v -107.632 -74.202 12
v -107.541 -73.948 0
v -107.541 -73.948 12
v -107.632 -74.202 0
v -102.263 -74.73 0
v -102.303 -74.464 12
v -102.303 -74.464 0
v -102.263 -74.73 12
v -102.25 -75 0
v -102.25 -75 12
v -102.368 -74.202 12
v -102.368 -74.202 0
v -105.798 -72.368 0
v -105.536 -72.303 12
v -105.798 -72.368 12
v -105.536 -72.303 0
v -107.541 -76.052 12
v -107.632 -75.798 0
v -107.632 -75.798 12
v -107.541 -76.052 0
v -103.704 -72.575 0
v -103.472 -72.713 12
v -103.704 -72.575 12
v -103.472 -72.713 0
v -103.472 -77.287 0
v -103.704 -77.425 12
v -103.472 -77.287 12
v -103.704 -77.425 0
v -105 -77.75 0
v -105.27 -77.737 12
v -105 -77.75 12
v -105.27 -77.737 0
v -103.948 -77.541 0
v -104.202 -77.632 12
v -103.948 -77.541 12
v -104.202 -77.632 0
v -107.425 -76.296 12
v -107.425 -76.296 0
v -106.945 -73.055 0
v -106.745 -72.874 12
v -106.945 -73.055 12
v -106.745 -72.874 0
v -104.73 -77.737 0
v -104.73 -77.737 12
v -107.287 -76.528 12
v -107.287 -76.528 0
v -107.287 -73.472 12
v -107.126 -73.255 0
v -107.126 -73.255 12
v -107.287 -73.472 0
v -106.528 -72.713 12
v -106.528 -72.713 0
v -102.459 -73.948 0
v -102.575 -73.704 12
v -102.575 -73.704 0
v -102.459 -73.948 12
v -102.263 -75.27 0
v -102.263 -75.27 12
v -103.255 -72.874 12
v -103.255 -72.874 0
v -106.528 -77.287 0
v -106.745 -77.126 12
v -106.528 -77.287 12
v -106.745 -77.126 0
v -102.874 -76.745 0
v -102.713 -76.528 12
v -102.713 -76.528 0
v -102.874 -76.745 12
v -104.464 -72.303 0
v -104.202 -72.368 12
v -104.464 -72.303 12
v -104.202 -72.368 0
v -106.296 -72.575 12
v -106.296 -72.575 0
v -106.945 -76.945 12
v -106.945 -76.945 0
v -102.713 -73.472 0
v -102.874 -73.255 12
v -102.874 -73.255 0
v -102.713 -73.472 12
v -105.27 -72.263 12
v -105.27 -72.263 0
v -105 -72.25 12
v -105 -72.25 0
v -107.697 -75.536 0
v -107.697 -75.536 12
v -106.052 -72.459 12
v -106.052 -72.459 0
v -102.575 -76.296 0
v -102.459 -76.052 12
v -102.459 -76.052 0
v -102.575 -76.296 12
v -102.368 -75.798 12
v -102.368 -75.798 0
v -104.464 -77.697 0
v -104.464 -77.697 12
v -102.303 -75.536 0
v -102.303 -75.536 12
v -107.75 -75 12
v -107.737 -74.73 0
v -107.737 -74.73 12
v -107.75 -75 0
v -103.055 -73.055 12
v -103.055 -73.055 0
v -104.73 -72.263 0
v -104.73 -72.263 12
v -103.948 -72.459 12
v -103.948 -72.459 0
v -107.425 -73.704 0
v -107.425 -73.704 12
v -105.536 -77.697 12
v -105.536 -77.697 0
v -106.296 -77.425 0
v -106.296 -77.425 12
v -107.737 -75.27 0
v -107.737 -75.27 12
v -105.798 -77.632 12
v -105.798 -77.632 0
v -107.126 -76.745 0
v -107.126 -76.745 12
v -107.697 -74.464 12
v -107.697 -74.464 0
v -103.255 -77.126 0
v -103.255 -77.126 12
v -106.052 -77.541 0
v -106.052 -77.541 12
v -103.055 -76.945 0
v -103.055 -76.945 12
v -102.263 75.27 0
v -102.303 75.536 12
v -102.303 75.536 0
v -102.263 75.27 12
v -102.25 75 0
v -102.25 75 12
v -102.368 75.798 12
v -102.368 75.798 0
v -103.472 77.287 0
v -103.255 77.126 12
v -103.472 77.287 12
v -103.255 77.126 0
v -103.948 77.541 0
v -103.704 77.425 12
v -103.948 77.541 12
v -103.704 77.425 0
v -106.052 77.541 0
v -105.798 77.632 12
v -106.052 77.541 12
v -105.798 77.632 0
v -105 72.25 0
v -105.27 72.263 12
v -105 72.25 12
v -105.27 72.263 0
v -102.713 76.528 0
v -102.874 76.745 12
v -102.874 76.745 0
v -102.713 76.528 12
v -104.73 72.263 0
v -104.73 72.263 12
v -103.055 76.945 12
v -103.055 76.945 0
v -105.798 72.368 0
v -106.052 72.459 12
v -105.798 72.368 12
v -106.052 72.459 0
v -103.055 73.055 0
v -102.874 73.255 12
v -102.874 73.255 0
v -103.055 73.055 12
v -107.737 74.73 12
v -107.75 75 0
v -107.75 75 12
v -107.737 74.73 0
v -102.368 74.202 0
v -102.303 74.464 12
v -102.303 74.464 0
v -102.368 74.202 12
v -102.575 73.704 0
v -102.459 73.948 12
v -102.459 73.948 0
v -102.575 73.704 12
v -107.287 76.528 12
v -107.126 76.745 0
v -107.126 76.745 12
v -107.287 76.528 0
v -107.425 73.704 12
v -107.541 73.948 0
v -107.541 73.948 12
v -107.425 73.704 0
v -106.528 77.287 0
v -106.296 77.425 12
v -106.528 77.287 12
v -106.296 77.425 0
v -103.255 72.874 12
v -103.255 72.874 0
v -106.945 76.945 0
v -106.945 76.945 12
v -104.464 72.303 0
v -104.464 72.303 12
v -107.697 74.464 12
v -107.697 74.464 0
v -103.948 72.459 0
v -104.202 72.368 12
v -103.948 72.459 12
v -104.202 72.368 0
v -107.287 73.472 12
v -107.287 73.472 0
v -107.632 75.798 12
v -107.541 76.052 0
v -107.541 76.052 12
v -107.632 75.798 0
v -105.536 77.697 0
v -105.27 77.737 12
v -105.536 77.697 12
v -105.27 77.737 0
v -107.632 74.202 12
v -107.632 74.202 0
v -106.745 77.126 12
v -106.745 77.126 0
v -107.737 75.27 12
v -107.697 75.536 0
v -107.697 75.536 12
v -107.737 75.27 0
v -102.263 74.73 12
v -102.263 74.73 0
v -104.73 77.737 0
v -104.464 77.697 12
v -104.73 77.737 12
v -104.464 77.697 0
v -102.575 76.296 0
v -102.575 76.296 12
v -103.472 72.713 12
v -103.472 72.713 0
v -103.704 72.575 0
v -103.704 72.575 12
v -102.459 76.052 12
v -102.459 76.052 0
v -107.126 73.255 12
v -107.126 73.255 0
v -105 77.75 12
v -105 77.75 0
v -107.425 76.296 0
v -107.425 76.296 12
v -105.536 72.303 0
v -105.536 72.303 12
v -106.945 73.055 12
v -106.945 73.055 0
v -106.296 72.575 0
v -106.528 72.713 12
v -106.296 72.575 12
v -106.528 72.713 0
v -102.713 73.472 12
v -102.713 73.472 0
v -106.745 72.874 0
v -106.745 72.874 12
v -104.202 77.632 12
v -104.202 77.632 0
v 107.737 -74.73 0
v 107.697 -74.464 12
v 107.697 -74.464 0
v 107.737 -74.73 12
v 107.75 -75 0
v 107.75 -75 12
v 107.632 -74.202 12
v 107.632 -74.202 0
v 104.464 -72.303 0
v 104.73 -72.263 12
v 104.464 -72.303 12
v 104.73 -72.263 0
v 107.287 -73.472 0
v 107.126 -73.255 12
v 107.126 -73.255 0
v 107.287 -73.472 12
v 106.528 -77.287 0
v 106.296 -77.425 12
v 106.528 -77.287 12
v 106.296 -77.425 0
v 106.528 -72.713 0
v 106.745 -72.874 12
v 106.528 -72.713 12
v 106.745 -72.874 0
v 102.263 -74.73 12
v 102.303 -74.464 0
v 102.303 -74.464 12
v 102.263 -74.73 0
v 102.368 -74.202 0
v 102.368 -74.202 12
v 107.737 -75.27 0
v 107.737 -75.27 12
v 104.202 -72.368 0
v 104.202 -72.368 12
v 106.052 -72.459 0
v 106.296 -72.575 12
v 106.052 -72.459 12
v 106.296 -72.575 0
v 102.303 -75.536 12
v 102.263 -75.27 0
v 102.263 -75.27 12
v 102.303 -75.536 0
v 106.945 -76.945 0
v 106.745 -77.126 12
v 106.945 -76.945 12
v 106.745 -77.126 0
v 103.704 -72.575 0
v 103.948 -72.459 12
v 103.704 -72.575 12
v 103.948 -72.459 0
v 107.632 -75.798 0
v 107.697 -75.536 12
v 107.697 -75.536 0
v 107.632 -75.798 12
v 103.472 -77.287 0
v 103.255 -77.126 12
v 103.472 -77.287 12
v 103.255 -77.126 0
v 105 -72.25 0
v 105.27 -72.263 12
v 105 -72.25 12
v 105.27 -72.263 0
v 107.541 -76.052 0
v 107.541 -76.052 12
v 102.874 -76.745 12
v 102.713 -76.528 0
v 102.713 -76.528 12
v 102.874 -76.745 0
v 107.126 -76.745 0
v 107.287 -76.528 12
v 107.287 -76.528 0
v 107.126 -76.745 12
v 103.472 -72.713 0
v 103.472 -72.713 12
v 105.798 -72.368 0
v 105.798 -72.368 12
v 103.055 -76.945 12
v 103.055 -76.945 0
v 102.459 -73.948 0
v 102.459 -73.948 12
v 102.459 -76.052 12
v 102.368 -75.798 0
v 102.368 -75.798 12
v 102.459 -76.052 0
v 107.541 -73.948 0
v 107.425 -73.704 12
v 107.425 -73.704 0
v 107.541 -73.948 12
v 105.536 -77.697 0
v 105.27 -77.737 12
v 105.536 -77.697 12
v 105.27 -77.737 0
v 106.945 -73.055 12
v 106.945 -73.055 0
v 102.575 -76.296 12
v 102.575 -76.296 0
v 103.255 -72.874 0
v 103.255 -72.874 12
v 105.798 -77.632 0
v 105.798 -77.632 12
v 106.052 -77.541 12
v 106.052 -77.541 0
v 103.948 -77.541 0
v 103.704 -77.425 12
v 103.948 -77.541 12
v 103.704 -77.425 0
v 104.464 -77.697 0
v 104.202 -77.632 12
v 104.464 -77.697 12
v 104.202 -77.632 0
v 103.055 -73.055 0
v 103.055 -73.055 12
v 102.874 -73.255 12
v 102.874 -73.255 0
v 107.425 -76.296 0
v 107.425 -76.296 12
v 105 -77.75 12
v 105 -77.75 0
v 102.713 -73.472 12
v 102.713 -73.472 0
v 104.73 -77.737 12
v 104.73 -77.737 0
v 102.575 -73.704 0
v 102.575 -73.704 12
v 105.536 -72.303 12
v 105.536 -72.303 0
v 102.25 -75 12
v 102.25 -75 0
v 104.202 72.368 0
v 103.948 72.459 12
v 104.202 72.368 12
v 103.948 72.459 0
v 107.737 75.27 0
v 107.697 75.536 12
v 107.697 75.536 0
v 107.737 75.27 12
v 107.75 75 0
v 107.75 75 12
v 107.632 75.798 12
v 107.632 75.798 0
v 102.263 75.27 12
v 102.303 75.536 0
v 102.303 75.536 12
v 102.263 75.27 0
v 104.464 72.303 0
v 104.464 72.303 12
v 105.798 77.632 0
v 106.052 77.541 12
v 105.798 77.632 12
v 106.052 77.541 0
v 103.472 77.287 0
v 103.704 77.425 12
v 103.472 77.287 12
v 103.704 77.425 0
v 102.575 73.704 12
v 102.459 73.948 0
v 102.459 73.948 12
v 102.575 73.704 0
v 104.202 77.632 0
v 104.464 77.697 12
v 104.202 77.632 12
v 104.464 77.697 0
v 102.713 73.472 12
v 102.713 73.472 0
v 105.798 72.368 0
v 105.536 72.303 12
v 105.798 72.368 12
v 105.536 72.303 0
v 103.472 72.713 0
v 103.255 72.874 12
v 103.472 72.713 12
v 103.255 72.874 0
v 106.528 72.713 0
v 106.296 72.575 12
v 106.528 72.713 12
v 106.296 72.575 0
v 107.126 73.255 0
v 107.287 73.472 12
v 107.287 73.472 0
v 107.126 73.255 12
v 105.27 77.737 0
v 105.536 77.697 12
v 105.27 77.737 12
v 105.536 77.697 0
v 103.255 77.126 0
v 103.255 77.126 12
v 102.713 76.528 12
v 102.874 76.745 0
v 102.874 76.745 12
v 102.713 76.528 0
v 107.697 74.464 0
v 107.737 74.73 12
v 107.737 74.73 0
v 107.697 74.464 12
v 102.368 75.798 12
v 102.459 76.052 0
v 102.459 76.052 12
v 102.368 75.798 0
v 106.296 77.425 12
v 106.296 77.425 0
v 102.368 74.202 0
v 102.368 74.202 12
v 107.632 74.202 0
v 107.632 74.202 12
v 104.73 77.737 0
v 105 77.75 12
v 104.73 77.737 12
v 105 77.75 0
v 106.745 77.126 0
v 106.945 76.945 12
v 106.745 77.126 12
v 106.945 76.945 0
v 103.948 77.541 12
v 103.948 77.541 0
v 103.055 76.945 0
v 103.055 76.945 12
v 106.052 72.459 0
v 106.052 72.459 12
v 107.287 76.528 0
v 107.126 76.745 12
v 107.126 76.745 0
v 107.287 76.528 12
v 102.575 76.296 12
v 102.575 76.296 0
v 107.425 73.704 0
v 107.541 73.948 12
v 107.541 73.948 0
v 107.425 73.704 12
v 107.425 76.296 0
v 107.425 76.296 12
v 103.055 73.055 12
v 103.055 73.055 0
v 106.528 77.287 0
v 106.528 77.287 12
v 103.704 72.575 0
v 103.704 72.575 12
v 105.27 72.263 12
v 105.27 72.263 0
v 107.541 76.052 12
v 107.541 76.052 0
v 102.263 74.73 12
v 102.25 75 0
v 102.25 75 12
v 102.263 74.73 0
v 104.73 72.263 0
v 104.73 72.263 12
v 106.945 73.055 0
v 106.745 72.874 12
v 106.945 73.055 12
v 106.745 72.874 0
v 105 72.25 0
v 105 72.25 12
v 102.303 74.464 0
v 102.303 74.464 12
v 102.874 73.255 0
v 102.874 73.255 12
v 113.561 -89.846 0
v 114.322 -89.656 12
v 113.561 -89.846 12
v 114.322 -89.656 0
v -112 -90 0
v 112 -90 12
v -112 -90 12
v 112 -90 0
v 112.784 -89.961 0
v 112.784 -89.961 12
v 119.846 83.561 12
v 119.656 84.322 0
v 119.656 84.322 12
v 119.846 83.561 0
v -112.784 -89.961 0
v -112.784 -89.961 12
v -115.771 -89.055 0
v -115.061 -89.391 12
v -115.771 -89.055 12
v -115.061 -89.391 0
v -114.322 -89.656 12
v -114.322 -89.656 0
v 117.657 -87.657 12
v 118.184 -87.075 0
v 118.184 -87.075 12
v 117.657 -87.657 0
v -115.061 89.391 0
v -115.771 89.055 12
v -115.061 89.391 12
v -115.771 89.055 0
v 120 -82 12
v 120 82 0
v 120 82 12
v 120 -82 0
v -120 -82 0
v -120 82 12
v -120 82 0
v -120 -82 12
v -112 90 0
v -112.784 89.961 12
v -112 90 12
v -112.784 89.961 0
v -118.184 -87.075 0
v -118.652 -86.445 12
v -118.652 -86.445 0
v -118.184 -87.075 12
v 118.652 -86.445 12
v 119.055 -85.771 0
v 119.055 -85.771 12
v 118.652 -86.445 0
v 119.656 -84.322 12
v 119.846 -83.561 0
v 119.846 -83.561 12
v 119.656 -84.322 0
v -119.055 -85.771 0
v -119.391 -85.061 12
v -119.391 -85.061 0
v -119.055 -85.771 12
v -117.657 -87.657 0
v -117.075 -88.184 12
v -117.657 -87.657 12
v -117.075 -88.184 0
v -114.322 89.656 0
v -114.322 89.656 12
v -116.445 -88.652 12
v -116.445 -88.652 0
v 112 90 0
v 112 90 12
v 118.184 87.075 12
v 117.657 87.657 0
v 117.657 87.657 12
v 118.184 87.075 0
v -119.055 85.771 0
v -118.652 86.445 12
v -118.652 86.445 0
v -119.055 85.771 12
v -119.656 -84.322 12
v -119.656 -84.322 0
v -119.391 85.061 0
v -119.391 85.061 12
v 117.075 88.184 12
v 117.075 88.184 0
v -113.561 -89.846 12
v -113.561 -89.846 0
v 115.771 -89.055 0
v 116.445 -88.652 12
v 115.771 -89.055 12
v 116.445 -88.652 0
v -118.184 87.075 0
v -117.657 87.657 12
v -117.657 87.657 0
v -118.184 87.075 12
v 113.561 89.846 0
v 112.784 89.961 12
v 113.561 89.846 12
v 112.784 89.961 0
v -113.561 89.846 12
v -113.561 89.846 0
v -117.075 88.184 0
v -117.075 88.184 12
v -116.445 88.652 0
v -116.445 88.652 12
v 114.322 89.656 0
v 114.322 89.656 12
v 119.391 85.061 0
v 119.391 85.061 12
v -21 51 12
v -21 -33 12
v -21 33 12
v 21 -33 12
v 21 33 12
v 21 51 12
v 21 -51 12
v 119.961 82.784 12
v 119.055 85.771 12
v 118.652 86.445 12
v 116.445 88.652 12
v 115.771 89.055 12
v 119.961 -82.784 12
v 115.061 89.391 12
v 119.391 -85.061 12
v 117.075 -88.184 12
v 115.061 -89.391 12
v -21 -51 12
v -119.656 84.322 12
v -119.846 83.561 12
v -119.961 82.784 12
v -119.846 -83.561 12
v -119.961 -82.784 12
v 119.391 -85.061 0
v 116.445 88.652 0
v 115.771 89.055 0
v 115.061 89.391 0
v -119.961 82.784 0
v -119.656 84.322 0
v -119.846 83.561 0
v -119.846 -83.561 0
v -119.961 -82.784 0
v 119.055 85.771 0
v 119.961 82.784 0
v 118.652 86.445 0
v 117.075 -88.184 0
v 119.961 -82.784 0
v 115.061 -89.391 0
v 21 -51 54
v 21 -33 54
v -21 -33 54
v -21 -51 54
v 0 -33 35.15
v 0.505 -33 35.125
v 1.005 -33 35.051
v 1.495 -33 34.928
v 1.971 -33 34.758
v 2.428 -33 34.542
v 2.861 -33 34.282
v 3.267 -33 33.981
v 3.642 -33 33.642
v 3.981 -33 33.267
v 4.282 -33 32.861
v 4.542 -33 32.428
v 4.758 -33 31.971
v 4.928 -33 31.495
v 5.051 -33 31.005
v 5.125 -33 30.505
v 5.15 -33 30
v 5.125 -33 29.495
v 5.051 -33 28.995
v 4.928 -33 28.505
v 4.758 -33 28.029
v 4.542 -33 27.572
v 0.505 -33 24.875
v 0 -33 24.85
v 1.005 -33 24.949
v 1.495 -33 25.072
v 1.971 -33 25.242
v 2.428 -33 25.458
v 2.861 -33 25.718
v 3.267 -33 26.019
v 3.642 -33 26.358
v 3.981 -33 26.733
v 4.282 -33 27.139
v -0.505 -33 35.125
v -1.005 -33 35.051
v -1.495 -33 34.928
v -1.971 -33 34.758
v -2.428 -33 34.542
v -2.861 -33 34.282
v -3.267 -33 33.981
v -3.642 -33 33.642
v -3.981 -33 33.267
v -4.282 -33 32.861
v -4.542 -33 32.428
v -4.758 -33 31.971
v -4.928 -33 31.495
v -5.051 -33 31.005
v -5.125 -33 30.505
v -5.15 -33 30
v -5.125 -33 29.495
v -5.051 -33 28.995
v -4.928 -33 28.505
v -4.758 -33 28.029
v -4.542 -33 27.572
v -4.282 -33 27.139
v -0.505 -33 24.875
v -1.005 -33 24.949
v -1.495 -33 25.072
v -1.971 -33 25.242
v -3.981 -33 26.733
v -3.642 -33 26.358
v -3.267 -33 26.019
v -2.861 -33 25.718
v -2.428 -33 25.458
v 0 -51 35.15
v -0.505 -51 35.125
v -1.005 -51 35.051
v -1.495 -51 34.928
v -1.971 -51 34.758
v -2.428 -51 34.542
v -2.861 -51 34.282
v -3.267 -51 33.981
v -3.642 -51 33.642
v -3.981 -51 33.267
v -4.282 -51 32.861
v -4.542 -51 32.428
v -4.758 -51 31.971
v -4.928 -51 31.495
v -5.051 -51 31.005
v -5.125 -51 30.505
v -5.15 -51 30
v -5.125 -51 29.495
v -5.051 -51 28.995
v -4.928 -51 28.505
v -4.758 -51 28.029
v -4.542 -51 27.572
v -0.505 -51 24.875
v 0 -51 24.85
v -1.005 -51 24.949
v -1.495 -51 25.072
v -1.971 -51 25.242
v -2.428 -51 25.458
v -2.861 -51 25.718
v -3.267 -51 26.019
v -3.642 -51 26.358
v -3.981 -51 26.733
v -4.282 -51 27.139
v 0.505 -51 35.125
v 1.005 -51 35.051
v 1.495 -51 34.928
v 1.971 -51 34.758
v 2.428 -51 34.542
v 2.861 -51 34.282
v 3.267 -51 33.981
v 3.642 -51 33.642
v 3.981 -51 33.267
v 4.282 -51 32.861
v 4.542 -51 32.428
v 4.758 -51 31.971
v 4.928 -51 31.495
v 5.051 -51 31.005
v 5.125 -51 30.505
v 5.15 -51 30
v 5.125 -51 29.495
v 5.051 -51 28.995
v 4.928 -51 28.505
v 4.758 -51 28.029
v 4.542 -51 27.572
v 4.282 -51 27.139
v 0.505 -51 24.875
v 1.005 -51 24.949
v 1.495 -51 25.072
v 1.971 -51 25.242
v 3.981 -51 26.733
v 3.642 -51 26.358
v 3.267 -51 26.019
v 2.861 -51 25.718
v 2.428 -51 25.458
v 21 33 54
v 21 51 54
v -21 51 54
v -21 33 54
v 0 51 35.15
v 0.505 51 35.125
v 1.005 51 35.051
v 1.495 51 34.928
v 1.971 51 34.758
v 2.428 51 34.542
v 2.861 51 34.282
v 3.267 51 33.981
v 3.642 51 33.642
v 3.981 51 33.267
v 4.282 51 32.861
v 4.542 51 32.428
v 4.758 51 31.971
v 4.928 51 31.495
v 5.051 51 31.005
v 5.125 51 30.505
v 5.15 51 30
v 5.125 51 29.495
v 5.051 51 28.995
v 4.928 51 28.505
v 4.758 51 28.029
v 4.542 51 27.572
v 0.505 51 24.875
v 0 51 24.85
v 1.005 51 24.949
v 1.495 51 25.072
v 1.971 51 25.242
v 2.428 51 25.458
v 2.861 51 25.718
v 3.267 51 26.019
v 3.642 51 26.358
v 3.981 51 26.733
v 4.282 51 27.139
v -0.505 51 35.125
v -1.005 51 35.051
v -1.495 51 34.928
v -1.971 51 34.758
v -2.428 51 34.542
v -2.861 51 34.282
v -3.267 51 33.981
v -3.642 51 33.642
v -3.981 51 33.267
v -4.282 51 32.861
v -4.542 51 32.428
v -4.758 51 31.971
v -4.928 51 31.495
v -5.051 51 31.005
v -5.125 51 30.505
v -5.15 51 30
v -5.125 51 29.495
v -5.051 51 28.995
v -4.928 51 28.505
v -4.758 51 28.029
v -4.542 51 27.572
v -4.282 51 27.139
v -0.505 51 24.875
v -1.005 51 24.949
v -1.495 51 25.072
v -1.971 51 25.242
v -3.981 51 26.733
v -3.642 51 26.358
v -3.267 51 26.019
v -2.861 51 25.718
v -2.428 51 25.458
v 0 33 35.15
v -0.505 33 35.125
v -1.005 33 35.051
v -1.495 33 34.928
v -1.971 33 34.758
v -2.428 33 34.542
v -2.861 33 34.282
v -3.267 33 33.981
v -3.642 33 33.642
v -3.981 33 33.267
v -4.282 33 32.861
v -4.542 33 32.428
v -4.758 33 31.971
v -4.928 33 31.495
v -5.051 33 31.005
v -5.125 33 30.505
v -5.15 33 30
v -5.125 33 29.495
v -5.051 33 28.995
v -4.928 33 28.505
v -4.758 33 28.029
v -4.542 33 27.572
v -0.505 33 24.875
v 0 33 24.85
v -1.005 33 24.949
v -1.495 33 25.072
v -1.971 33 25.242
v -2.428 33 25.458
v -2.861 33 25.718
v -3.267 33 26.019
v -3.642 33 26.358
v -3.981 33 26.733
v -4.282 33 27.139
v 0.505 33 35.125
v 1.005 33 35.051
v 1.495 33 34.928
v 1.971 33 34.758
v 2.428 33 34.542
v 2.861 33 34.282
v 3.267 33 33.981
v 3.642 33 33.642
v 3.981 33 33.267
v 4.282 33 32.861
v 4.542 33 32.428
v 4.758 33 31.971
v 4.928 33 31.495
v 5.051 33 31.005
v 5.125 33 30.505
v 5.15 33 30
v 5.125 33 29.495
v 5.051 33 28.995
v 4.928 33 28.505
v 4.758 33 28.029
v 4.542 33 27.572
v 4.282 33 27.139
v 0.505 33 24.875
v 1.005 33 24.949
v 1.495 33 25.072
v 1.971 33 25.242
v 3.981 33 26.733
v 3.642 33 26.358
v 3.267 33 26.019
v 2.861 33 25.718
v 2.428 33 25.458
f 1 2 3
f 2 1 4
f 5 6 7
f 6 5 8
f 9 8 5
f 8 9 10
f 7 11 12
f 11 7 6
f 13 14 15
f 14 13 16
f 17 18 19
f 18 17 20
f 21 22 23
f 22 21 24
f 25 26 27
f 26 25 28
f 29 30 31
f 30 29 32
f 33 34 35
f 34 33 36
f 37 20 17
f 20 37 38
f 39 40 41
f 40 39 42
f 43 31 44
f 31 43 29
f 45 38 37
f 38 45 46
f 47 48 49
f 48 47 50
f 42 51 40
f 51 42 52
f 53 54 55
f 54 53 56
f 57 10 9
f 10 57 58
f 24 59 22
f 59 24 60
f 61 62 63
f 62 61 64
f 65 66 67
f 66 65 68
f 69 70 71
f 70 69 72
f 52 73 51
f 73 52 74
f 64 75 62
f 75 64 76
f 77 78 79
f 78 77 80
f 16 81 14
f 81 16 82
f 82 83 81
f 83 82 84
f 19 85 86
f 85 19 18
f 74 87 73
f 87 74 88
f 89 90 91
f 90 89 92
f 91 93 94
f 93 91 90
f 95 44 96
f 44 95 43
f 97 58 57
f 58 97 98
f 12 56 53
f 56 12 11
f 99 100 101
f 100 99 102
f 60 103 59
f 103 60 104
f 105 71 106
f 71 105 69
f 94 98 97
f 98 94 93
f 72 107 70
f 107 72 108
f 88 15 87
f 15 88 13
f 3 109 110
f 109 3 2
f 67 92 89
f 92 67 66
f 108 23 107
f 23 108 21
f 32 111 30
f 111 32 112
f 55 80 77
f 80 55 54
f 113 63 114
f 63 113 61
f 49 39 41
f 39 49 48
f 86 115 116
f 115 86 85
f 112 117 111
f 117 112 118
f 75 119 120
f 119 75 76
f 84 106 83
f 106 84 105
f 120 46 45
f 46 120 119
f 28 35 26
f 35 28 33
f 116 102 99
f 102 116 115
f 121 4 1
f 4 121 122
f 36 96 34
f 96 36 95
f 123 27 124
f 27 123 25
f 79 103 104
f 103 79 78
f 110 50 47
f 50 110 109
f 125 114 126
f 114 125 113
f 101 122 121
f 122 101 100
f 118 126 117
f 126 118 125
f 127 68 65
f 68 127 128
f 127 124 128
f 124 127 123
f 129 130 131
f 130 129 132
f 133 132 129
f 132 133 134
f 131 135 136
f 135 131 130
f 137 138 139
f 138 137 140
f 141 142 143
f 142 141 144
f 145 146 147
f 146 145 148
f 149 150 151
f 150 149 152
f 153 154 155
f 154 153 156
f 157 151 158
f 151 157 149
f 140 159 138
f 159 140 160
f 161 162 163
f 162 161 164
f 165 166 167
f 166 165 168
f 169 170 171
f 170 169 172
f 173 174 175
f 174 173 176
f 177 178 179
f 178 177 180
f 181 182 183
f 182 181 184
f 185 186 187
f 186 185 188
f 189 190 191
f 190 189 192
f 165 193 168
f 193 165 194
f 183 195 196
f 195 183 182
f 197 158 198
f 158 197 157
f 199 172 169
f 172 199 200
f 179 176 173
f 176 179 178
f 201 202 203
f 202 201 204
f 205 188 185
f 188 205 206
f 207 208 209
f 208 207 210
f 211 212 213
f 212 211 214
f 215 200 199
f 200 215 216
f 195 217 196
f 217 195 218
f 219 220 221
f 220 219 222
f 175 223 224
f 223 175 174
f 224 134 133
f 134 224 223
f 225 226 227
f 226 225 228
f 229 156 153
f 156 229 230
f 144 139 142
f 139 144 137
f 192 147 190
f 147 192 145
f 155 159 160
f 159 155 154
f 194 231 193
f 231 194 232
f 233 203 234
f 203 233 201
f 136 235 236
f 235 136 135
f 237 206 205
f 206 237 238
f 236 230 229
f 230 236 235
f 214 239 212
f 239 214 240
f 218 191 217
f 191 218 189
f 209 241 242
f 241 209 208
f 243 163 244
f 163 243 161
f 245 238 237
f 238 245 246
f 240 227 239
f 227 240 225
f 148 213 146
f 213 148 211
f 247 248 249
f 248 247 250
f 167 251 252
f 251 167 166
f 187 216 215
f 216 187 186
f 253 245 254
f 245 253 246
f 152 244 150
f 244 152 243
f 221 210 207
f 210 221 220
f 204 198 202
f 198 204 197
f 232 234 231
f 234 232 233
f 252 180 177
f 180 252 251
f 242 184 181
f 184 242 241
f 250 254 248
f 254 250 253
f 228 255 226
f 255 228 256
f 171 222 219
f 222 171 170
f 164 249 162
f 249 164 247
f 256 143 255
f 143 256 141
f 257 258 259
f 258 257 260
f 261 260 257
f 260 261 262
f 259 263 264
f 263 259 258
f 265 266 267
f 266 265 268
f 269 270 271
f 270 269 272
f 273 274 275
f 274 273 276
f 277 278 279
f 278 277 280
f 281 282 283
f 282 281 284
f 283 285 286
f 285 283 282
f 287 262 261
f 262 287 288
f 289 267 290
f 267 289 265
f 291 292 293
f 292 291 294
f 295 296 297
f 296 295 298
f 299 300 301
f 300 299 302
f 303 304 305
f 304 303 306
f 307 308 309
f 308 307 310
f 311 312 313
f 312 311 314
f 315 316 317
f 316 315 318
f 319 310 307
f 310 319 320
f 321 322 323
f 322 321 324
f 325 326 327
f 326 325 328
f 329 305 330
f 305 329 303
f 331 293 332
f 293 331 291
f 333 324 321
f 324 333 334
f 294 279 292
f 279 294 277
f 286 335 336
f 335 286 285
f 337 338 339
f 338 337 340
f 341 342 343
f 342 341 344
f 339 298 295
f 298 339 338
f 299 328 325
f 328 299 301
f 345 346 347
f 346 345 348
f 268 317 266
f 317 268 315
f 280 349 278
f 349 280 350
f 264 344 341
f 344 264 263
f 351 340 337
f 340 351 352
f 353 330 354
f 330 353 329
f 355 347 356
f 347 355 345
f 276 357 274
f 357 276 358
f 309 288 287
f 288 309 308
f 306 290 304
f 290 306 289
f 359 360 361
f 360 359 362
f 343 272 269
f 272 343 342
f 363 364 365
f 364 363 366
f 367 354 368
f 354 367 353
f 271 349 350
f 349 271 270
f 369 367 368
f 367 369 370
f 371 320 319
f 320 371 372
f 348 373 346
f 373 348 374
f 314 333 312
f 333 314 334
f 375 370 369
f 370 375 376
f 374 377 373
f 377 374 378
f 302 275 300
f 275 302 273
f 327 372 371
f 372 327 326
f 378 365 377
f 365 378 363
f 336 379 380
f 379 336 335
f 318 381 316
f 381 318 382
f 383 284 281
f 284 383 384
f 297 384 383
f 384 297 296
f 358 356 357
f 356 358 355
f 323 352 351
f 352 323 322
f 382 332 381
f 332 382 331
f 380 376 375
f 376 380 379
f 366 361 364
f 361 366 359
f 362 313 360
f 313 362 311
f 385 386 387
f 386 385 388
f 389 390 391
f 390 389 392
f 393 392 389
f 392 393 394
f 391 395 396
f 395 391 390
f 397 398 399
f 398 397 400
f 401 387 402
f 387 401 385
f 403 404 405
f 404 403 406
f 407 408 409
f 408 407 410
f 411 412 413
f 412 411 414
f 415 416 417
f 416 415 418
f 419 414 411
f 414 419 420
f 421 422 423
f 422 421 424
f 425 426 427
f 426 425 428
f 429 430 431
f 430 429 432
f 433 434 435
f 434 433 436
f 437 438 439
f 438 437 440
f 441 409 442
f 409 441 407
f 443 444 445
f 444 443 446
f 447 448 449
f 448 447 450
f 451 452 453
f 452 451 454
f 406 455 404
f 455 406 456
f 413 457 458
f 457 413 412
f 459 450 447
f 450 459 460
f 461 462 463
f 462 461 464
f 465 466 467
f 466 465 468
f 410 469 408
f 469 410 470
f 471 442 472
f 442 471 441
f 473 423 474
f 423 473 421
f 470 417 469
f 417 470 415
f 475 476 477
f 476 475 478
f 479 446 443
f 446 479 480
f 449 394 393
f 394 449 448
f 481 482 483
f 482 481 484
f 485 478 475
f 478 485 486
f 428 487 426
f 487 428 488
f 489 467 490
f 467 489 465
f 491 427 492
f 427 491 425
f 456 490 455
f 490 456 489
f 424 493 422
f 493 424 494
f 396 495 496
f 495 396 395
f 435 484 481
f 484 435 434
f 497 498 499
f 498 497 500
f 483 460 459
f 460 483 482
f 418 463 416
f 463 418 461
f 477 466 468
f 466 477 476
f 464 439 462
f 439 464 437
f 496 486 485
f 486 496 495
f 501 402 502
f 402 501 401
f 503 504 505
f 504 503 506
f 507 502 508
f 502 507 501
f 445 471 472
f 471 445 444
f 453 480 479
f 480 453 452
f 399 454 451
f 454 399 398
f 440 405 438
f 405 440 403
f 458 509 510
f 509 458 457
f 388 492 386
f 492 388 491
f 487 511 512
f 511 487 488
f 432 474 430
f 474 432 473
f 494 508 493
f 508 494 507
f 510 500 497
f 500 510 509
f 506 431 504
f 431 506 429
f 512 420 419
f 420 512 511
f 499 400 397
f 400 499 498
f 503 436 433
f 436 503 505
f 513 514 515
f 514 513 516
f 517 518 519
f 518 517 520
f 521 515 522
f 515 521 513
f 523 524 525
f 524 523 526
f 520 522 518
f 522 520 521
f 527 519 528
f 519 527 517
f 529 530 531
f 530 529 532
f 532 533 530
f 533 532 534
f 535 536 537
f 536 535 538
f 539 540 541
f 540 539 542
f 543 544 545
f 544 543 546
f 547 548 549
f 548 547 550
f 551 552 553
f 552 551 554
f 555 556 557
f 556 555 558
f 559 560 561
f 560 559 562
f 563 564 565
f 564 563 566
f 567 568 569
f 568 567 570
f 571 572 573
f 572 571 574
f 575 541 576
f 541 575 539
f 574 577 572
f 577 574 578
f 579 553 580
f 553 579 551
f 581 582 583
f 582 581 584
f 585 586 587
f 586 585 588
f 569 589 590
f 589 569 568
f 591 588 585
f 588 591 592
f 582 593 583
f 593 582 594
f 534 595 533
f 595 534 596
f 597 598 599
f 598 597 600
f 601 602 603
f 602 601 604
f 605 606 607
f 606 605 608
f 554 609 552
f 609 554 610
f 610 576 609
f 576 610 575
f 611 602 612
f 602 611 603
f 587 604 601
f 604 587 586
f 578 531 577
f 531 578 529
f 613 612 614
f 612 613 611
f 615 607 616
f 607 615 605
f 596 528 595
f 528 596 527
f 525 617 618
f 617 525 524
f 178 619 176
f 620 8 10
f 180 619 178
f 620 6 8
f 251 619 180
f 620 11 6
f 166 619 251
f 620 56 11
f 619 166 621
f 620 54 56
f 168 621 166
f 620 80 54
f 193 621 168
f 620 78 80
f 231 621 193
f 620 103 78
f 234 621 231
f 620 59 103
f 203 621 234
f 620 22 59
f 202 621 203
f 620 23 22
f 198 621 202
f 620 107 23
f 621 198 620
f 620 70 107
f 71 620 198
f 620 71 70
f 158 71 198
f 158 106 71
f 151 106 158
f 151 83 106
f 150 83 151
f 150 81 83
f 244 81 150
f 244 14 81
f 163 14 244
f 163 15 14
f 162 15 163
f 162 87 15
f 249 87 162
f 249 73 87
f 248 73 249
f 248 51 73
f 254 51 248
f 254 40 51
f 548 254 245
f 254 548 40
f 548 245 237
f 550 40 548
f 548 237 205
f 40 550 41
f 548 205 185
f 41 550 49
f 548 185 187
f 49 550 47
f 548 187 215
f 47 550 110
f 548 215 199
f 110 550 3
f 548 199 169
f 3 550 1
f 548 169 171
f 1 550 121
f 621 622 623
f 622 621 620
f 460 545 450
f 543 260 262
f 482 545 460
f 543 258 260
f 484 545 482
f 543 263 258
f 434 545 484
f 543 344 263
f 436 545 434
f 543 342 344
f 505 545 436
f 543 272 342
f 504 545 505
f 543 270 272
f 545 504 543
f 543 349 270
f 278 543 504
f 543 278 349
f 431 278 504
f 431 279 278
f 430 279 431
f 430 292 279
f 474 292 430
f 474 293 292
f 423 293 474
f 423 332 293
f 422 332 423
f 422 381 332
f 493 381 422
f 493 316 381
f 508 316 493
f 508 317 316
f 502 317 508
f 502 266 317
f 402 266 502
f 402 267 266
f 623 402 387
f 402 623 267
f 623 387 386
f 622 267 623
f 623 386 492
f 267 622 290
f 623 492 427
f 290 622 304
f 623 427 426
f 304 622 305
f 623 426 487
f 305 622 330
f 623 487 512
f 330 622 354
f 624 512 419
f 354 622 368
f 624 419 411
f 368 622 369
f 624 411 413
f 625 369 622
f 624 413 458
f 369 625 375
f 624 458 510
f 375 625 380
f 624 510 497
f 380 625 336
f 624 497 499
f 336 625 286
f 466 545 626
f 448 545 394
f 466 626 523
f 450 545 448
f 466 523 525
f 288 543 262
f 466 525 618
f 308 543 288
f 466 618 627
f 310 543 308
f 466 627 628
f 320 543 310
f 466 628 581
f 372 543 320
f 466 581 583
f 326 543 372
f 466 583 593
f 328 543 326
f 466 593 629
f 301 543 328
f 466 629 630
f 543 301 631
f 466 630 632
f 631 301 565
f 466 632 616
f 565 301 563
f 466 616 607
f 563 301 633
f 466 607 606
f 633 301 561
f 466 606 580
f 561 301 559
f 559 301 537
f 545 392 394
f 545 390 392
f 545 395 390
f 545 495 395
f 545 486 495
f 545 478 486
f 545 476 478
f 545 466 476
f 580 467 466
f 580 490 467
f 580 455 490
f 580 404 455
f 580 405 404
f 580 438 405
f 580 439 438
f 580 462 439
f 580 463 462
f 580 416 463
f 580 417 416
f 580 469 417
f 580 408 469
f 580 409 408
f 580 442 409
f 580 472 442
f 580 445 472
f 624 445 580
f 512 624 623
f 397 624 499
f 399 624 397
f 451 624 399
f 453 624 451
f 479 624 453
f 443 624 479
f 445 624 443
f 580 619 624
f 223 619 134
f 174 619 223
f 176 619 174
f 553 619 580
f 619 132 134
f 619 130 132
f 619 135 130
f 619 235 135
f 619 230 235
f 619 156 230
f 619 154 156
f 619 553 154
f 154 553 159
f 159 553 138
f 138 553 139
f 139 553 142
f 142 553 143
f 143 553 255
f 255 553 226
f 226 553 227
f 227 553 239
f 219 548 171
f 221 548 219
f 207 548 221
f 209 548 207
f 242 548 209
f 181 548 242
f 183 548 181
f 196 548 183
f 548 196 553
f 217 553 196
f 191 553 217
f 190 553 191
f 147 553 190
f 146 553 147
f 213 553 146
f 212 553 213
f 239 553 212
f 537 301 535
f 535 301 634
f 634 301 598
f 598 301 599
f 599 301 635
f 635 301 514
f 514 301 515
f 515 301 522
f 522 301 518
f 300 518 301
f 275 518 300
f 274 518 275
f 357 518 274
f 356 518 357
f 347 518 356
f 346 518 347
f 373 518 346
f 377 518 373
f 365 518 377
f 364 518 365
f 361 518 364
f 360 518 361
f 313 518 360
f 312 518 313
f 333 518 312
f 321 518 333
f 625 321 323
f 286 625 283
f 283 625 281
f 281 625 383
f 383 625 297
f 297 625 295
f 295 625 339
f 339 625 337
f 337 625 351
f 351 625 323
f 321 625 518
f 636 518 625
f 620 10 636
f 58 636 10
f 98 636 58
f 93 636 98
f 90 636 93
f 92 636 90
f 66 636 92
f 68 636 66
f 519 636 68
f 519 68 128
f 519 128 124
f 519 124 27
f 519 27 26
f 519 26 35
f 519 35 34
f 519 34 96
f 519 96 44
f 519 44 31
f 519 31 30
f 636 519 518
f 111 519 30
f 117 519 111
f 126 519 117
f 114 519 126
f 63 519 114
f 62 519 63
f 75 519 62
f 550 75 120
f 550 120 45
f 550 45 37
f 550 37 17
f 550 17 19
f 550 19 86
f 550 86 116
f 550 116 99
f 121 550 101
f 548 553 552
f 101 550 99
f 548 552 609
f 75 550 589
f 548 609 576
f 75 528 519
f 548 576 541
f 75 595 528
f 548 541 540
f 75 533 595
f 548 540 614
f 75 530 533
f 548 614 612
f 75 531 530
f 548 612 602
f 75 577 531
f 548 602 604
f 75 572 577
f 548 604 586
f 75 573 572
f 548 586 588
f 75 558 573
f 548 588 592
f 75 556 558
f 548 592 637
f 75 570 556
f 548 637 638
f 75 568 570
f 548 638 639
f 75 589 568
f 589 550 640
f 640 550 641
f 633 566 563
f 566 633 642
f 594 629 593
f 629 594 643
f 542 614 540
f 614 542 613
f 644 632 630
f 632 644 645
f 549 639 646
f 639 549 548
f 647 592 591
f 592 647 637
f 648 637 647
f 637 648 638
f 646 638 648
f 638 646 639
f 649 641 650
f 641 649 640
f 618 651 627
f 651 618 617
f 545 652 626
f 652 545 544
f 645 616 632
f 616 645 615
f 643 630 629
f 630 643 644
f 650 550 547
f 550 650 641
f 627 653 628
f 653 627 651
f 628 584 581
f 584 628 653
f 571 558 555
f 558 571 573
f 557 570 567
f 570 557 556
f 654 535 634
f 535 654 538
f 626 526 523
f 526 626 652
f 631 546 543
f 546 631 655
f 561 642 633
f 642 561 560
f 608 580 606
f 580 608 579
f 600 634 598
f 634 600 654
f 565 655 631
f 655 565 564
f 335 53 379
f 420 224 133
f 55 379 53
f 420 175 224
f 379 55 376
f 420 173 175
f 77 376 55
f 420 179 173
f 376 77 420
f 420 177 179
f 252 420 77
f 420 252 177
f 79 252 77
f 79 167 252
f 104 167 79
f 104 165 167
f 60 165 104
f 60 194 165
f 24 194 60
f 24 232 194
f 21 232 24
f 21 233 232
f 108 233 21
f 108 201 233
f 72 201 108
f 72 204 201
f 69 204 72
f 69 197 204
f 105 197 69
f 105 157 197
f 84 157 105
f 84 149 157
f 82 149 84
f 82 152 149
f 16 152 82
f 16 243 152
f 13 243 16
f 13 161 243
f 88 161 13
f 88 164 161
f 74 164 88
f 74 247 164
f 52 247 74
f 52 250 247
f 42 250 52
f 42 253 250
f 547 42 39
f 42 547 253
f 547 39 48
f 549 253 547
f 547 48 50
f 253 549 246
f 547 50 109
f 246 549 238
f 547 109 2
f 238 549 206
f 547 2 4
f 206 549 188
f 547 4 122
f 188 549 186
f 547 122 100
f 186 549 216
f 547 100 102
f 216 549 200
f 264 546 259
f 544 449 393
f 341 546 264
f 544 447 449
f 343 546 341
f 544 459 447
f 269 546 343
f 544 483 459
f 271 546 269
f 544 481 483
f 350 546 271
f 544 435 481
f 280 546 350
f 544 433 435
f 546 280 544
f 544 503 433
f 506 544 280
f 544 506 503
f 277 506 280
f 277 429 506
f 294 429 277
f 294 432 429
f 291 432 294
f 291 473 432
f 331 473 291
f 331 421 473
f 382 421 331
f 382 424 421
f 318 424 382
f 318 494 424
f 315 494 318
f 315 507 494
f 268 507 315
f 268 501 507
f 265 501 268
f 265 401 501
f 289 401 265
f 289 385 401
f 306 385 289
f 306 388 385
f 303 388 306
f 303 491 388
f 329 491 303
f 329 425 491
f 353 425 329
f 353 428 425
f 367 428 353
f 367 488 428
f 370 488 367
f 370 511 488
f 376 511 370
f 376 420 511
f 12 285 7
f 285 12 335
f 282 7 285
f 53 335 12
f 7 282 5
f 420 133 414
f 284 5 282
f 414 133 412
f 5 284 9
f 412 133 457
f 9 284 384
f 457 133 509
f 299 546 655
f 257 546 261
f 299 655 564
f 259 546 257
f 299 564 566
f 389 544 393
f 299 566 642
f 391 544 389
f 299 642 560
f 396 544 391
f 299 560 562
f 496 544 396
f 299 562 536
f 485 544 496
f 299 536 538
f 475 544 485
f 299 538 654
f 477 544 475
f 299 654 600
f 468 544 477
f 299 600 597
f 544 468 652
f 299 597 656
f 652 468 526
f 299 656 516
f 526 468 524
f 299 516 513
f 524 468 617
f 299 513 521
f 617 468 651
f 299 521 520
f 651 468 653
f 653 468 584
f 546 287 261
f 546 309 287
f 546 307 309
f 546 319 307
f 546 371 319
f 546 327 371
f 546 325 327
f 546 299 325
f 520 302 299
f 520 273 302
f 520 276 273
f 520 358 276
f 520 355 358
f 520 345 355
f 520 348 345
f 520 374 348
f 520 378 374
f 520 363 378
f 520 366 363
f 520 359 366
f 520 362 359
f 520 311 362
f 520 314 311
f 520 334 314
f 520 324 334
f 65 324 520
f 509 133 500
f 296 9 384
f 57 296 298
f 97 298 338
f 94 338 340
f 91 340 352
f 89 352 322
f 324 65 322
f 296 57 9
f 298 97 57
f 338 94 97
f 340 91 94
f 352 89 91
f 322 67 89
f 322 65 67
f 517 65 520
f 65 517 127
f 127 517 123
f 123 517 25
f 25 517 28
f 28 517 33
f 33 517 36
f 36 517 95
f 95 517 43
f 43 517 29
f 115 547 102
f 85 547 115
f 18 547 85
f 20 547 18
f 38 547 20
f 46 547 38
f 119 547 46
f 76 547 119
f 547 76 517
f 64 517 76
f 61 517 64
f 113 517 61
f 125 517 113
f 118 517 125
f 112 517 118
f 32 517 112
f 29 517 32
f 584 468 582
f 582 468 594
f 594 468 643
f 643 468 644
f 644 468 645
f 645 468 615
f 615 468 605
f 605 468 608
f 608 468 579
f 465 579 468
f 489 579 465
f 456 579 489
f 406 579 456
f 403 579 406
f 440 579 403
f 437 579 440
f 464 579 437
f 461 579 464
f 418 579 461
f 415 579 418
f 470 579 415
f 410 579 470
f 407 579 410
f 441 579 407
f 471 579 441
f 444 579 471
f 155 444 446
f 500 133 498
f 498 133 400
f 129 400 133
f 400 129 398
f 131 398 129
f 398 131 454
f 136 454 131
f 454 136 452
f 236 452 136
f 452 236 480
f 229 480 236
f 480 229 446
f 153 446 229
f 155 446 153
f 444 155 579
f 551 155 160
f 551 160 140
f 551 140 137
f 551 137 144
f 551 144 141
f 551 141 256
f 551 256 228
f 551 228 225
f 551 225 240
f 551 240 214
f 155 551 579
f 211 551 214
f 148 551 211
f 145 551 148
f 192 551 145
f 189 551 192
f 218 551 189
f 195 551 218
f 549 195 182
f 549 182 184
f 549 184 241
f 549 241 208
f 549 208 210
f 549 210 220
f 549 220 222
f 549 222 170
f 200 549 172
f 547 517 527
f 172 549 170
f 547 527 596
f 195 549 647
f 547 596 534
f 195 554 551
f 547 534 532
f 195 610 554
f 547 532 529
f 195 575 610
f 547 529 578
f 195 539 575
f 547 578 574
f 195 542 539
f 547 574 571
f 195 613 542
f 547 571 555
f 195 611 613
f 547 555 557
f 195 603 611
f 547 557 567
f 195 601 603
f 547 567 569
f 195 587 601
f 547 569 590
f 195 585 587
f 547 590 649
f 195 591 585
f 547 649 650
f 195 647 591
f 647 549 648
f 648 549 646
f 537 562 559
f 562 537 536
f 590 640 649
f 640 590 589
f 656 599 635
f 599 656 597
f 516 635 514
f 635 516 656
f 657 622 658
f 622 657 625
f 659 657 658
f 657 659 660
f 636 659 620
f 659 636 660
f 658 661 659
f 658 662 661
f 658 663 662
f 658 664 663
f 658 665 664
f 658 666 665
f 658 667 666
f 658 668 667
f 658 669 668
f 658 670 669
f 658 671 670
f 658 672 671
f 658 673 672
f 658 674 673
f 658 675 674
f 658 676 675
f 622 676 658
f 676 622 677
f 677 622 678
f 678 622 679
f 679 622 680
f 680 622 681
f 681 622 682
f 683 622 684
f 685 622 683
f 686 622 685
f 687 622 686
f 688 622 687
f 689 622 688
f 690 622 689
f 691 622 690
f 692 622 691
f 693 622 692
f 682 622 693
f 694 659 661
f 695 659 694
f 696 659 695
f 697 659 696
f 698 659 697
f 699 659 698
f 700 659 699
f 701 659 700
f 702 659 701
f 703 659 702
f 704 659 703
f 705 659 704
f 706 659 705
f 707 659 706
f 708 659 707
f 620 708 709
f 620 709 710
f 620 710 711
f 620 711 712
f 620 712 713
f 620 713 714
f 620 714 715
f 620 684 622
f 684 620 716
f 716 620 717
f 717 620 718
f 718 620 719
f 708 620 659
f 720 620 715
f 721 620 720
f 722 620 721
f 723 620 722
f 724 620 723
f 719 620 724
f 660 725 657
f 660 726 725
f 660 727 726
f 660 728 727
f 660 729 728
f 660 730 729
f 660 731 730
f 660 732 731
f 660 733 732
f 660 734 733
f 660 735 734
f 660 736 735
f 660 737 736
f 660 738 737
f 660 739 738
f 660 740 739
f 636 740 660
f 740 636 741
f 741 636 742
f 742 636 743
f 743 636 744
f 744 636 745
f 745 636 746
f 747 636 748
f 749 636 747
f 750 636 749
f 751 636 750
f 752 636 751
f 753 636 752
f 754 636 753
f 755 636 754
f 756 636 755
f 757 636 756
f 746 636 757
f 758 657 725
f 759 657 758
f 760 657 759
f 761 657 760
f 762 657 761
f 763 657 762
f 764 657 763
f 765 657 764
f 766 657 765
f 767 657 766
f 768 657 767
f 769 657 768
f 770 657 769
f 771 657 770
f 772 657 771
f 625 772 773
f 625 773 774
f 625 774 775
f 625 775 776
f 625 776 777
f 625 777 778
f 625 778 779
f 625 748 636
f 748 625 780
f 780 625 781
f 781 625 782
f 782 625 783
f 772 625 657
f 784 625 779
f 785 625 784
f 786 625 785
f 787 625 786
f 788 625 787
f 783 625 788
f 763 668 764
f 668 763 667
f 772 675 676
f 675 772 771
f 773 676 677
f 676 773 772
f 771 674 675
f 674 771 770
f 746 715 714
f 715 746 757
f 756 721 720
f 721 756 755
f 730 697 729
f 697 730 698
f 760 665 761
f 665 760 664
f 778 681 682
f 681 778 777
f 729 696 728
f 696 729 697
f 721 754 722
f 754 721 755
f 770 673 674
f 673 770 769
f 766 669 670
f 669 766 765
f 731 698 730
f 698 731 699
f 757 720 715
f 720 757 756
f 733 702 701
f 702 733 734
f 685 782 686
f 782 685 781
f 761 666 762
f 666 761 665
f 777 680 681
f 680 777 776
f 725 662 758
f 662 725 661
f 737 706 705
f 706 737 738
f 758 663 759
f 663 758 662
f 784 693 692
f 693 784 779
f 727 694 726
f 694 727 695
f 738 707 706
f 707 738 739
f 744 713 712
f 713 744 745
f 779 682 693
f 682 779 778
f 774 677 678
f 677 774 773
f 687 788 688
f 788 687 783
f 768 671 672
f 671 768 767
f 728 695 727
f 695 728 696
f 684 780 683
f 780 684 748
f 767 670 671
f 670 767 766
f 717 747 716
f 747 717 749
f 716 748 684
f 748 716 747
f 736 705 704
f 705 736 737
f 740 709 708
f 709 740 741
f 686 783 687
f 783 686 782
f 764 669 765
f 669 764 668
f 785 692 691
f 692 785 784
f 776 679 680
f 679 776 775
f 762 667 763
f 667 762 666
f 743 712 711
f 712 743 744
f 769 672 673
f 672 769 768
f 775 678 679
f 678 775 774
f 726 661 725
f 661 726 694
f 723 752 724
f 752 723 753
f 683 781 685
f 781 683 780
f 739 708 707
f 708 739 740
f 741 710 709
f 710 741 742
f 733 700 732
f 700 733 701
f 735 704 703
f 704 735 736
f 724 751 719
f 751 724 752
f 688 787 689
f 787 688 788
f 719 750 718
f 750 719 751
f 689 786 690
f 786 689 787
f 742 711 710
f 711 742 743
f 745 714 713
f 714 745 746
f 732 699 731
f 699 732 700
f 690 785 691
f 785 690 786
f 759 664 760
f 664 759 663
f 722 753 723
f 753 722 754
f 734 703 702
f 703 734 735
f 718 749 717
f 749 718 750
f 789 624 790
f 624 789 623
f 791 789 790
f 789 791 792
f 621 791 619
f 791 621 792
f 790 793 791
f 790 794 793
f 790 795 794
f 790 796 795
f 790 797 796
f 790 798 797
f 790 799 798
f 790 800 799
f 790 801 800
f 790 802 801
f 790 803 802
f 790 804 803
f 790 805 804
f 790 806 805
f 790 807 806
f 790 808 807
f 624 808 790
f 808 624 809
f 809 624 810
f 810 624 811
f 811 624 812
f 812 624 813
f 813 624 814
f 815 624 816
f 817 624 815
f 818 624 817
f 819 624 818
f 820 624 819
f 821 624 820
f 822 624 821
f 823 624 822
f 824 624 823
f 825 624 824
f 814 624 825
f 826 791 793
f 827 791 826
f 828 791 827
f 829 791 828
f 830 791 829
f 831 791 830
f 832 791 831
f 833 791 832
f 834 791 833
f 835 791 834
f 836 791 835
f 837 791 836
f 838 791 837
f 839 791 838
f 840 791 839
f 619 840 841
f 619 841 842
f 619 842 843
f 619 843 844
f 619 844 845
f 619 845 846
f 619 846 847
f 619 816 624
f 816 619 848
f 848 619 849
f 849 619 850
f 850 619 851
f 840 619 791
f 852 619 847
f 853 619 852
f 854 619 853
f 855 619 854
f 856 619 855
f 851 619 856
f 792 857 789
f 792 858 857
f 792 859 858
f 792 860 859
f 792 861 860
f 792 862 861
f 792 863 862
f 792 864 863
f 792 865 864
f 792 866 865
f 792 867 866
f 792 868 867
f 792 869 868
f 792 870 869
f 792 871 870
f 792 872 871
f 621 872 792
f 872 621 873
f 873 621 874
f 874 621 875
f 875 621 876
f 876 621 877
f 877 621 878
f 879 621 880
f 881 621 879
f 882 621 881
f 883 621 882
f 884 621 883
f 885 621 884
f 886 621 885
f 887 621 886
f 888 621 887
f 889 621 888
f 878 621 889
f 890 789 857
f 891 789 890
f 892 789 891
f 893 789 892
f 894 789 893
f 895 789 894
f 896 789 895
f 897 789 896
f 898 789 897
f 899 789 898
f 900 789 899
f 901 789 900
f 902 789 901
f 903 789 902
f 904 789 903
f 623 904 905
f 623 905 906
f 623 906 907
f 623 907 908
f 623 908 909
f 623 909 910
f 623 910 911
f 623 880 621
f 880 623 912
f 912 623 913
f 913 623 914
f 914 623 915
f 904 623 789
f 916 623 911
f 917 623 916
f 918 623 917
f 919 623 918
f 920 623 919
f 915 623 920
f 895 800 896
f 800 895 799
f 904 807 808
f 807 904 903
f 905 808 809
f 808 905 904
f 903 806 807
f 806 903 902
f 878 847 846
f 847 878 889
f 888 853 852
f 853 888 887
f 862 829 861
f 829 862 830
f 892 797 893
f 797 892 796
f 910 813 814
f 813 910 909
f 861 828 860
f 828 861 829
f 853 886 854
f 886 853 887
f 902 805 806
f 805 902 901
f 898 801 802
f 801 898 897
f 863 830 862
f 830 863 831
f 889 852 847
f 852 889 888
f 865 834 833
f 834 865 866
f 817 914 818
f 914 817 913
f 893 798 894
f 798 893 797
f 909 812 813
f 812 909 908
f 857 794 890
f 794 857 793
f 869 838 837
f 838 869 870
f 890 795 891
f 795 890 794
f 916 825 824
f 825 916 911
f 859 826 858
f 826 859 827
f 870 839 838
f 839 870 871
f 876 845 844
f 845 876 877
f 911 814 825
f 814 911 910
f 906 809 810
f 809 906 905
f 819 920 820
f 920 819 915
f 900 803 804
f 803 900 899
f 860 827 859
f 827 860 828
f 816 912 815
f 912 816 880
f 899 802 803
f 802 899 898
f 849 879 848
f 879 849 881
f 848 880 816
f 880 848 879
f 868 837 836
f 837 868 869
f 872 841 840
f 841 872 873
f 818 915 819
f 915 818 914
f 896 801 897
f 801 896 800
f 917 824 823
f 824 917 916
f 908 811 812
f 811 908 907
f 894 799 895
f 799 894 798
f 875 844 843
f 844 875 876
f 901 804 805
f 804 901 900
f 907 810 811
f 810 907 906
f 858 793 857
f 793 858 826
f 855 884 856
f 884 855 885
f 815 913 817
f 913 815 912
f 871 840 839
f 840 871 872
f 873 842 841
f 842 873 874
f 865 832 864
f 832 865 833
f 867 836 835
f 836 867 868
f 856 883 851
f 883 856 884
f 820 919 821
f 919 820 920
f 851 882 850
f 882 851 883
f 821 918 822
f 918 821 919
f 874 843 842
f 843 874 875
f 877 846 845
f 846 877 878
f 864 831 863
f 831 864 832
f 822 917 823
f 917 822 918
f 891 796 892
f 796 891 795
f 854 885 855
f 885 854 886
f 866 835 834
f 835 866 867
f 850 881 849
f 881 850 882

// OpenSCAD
// file: ../../common.scad
$fn=64;
module rounded_box2d(x,y,r=4){ offset(r=r) offset(delta=-r) square([x,y],center=true); }
module plate(x,y,h,r=4){ linear_extrude(h) rounded_box2d(x,y,r); }
module slot3d(len,d,h){ hull(){translate([-len/2,0,0])cylinder(h=h,d=d,center=true);translate([len/2,0,0])cylinder(h=h,d=d,center=true);} }
// main file
include <../../common.scad>
x=240;y=180;h=12;m5=5.5;
difference(){plate(x,y,h,8);for(xx=[-105,105])for(yy=[-75,75])translate([xx,yy,-1])cylinder(h=h+2,d=m5);}
for(yy=[-42,42])translate([0,yy,h+18])difference(){cube([42,18,48],center=true);rotate([90,0,0])cylinder(h=30,d=10.3,center=true);}
